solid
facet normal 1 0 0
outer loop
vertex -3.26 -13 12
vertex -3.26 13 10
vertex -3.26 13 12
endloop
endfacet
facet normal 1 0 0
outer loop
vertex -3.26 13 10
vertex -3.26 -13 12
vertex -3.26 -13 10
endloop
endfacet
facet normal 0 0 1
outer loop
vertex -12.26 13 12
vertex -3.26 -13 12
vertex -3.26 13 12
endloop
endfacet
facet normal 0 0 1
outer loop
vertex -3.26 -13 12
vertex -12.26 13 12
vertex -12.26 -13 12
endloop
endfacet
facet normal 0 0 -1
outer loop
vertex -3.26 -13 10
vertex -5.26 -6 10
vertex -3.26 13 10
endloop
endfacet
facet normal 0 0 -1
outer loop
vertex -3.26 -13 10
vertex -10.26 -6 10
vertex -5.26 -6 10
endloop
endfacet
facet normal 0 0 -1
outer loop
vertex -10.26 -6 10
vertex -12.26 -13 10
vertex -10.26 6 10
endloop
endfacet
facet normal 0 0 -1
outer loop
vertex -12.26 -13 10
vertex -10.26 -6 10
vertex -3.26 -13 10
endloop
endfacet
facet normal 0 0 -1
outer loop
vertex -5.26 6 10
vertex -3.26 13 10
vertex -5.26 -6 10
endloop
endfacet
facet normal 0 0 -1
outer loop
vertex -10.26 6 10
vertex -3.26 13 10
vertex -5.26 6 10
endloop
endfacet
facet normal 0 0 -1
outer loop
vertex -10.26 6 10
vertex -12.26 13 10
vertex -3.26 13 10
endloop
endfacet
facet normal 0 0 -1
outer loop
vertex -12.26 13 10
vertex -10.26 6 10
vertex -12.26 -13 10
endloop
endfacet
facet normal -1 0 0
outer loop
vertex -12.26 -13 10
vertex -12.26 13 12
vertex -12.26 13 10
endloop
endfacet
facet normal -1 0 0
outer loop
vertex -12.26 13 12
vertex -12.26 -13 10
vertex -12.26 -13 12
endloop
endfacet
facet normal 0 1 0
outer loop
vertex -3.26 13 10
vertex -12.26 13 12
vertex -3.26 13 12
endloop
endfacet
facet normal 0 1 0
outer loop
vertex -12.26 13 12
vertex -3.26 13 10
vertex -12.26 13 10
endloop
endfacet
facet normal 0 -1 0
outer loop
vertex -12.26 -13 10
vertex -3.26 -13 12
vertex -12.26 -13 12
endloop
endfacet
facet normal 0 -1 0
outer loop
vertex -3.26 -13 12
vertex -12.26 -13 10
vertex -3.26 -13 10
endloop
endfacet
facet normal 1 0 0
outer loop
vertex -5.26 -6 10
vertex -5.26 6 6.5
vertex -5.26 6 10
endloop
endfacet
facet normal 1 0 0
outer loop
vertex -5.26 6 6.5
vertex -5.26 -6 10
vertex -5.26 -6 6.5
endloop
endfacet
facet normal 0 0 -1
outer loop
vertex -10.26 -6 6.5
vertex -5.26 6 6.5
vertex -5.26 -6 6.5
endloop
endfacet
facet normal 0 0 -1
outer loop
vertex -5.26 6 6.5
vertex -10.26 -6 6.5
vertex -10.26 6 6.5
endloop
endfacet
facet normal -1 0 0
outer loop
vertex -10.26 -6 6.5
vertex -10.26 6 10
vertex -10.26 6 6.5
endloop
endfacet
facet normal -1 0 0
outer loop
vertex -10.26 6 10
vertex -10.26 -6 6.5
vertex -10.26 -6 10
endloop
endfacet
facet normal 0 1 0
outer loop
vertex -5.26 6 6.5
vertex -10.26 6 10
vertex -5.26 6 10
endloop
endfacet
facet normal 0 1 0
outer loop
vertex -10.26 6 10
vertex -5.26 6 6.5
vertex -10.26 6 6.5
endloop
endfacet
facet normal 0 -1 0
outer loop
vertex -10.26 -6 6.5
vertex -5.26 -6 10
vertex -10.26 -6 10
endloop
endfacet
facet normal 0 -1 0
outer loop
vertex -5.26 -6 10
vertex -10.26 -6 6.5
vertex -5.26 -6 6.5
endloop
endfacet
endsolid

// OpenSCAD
// file: ../board-pocket.scad
//-----------------------------------------------------------------------
// Board pocket: holds a board that has no mounting holes
//
// The board sits on a central pedestal with a pad of double-sided foam tape
// on top, inside a low wall that follows its outline. The pedestal keeps
// the board's edges off the floor, so lead stubs soldered through the edge
// holes have room underneath; gaps in the wall let the leads out. The wall
// only locates the board: the tape holds it down, and in a closed box a lid
// pad presses a pad of foam onto it (boardLidPad below).
//
// Modules, all in the same frame:
//   boardPocketGhost()   the board and its tape, for previews
//   boardPocketHolder()  the plastic: pedestal and outline wall, add to the floor
//   boardLidPad()        a block hanging from the lid that presses foam onto the board
//   boardLidPadGhost()   the foam under it, squashed, for previews
//
// Frame: origin on the floor top, under the centre of the board's outline.
// X along the board's length l, Y across its width w, Z up. Units: mm.
//
// Sides are listed [-X, +X, -Y, +Y], each one of
//   "gap"    wall with a gap in the middle for leads (gapW wide)
//   "solid"  whole wall: use it where the board takes a push (a plug)
//   "open"   no wall: the board's edge goes into a box wall (a USB port)
//
// Used by esp32-c3-supermini, esp32-s3-devkitc and rs485-max485.
//-----------------------------------------------------------------------

//-- From the controller project's receiver.scad / rack-end.scad (boardPocket), 2026-10-30
bpPedestal  = 2.5;     // floor to the tape: room for lead stubs under the board edges
bpTape      = 1.0;     // double-sided foam tape on the pedestal. CAL: how far it squashes
bpWall      = 1.2;     // outline wall thickness
bpRise      = 1.0;     // wall top above the PCB underside (the controller project's rack-end: 0.8 under the S3's module)
bpClearance = 0.4;     // per side, board outline to wall: PETG. 0.3 for PLA. Set by the fit piece
bpGapW      = 6;       // lead gap in a "gap" side
bpPadInset  = 4;       // default pedestal: the board less this all round

//-- Lid hold-down (the controller project's receiver / rack-end lid pads)
bpFoam      = 3.0;     // CAL: self-adhesive foam stuck under each lid pad
bpSqueeze   = 1.0;     // how far the lid squashes it: ~1/3 for soft foam, 0.3 for felt

//-- PCB underside above the floor top
function boardPocketZ(pedestal = bpPedestal, tape = bpTape) = pedestal + tape;
//-- default pedestal [l, w] for a board
function boardPocketPad(l, w, inset = bpPadInset) = [max(l - 2*inset, 4), max(w - 2*inset, 4)];
//-- Z of a lid pad's underside, pressing on a surface at surfaceZ (board top, or a part on it)
function boardLidPadZ(surfaceZ, foam = bpFoam, squeeze = bpSqueeze) =
  assert(squeeze > 0 && squeeze < foam, "foam would not touch the board")
  surfaceZ + foam - squeeze;

function bpSides4(s) = is_list(s) ? s : [s, s, s, s];

module boardPocketGhost(l, w, pcb = 1.6, pad, pedestal = bpPedestal, tape = bpTape)
{
  p = is_undef(pad) ? boardPocketPad(l, w) : pad;
  %color("White") translate([-p[0]/2, -p[1]/2, pedestal]) cube([p[0], p[1], tape]);
  %color("DarkGreen") translate([-l/2, -w/2, pedestal + tape]) cube([l, w, pcb]);
}

//-- pad: pedestal [l, w]; gapW a number or one per side
module boardPocketHolder(l, w, pad, sides = "gap", gapW = bpGapW, clearance = bpClearance,
                         pedestal = bpPedestal, tape = bpTape, wall = bpWall, rise = bpRise)
{
  p   = is_undef(pad) ? boardPocketPad(l, w) : pad;
  s   = bpSides4(sides);
  g   = bpSides4(gapW);
  ix  = l/2 + clearance;                 // inner half sizes
  iy  = w/2 + clearance;
  top = pedestal + tape + rise;
  assert(p[0] <= l && p[1] <= w, "pedestal bigger than the board");
  for (k = s) assert(k == "gap" || k == "solid" || k == "open", str("unknown side ", k));

  //-- pedestal, centred under the board
  translate([-p[0]/2, -p[1]/2, -0.01]) cube([p[0], p[1], pedestal + 0.01]);
  //-- outline wall
  difference()
  {
    translate([-ix - wall, -iy - wall, -0.01]) cube([2*(ix + wall), 2*(iy + wall), top + 0.01]);
    translate([-ix, -iy, -1]) cube([2*ix, 2*iy, top + 2]);
    for (i = [0 : 3])
    {
      //-- each side's cut, drawn for -X then turned into place
      ax = (i < 2) ? ix : iy;         // inner half size across the side
      al = (i < 2) ? iy : ix;         // half length along it
      rotate([0, 0, [0, 180, 90, 270][i]])   // -X, +X, -Y, +Y
      {
        if (s[i] == "gap")
          translate([-ax - wall - 1, -g[i]/2, -1]) cube([wall + 2, g[i], top + 2]);
        if (s[i] == "open")
          translate([-ax - wall - 1, -al - wall - 1, -1]) cube([wall + 1.01, 2*(al + wall + 1), top + 2]);
      }
    }
  }
}

//-- A lid pad over the rectangle size [x, y] centred at `at`, from the squashed foam up to
//-- lidZ (the lid's inner face in this frame), running `into` up into the lid plate
module boardLidPad(size, at = [0, 0], surfaceZ, lidZ, foam = bpFoam, squeeze = bpSqueeze, into = 0.5)
{
  z0 = boardLidPadZ(surfaceZ, foam, squeeze);
  assert(lidZ > z0, "lid is below the pad: the box is too low for the foam");
  translate([at[0] - size[0]/2, at[1] - size[1]/2, z0]) cube([size[0], size[1], lidZ - z0 + into]);
}

module boardLidPadGhost(size, at = [0, 0], surfaceZ, foam = bpFoam, squeeze = bpSqueeze)
{
  %color("Gray") translate([at[0] - size[0]/2, at[1] - size[1]/2, surfaceZ]) cube([size[0], size[1], foam - squeeze]);
}
// main file
// A strip of lid with its pad, pressing foam onto the board's end, for the catalogue.
include <../board-pocket.scad>

l = 22.52; w = 18; pcb = 1.0;
lidZ = 10;      // lid's inner face above the floor
lidT = 2.0;
top  = boardPocketZ() + pcb;
translate([-l/2 - 1, -w/2 - 4, lidZ]) cube([9, w + 8, lidT]);   // a strip of lid over the pad
boardLidPad([5, w - 6], [-l/2 + 3.5, 0], top, lidZ);
